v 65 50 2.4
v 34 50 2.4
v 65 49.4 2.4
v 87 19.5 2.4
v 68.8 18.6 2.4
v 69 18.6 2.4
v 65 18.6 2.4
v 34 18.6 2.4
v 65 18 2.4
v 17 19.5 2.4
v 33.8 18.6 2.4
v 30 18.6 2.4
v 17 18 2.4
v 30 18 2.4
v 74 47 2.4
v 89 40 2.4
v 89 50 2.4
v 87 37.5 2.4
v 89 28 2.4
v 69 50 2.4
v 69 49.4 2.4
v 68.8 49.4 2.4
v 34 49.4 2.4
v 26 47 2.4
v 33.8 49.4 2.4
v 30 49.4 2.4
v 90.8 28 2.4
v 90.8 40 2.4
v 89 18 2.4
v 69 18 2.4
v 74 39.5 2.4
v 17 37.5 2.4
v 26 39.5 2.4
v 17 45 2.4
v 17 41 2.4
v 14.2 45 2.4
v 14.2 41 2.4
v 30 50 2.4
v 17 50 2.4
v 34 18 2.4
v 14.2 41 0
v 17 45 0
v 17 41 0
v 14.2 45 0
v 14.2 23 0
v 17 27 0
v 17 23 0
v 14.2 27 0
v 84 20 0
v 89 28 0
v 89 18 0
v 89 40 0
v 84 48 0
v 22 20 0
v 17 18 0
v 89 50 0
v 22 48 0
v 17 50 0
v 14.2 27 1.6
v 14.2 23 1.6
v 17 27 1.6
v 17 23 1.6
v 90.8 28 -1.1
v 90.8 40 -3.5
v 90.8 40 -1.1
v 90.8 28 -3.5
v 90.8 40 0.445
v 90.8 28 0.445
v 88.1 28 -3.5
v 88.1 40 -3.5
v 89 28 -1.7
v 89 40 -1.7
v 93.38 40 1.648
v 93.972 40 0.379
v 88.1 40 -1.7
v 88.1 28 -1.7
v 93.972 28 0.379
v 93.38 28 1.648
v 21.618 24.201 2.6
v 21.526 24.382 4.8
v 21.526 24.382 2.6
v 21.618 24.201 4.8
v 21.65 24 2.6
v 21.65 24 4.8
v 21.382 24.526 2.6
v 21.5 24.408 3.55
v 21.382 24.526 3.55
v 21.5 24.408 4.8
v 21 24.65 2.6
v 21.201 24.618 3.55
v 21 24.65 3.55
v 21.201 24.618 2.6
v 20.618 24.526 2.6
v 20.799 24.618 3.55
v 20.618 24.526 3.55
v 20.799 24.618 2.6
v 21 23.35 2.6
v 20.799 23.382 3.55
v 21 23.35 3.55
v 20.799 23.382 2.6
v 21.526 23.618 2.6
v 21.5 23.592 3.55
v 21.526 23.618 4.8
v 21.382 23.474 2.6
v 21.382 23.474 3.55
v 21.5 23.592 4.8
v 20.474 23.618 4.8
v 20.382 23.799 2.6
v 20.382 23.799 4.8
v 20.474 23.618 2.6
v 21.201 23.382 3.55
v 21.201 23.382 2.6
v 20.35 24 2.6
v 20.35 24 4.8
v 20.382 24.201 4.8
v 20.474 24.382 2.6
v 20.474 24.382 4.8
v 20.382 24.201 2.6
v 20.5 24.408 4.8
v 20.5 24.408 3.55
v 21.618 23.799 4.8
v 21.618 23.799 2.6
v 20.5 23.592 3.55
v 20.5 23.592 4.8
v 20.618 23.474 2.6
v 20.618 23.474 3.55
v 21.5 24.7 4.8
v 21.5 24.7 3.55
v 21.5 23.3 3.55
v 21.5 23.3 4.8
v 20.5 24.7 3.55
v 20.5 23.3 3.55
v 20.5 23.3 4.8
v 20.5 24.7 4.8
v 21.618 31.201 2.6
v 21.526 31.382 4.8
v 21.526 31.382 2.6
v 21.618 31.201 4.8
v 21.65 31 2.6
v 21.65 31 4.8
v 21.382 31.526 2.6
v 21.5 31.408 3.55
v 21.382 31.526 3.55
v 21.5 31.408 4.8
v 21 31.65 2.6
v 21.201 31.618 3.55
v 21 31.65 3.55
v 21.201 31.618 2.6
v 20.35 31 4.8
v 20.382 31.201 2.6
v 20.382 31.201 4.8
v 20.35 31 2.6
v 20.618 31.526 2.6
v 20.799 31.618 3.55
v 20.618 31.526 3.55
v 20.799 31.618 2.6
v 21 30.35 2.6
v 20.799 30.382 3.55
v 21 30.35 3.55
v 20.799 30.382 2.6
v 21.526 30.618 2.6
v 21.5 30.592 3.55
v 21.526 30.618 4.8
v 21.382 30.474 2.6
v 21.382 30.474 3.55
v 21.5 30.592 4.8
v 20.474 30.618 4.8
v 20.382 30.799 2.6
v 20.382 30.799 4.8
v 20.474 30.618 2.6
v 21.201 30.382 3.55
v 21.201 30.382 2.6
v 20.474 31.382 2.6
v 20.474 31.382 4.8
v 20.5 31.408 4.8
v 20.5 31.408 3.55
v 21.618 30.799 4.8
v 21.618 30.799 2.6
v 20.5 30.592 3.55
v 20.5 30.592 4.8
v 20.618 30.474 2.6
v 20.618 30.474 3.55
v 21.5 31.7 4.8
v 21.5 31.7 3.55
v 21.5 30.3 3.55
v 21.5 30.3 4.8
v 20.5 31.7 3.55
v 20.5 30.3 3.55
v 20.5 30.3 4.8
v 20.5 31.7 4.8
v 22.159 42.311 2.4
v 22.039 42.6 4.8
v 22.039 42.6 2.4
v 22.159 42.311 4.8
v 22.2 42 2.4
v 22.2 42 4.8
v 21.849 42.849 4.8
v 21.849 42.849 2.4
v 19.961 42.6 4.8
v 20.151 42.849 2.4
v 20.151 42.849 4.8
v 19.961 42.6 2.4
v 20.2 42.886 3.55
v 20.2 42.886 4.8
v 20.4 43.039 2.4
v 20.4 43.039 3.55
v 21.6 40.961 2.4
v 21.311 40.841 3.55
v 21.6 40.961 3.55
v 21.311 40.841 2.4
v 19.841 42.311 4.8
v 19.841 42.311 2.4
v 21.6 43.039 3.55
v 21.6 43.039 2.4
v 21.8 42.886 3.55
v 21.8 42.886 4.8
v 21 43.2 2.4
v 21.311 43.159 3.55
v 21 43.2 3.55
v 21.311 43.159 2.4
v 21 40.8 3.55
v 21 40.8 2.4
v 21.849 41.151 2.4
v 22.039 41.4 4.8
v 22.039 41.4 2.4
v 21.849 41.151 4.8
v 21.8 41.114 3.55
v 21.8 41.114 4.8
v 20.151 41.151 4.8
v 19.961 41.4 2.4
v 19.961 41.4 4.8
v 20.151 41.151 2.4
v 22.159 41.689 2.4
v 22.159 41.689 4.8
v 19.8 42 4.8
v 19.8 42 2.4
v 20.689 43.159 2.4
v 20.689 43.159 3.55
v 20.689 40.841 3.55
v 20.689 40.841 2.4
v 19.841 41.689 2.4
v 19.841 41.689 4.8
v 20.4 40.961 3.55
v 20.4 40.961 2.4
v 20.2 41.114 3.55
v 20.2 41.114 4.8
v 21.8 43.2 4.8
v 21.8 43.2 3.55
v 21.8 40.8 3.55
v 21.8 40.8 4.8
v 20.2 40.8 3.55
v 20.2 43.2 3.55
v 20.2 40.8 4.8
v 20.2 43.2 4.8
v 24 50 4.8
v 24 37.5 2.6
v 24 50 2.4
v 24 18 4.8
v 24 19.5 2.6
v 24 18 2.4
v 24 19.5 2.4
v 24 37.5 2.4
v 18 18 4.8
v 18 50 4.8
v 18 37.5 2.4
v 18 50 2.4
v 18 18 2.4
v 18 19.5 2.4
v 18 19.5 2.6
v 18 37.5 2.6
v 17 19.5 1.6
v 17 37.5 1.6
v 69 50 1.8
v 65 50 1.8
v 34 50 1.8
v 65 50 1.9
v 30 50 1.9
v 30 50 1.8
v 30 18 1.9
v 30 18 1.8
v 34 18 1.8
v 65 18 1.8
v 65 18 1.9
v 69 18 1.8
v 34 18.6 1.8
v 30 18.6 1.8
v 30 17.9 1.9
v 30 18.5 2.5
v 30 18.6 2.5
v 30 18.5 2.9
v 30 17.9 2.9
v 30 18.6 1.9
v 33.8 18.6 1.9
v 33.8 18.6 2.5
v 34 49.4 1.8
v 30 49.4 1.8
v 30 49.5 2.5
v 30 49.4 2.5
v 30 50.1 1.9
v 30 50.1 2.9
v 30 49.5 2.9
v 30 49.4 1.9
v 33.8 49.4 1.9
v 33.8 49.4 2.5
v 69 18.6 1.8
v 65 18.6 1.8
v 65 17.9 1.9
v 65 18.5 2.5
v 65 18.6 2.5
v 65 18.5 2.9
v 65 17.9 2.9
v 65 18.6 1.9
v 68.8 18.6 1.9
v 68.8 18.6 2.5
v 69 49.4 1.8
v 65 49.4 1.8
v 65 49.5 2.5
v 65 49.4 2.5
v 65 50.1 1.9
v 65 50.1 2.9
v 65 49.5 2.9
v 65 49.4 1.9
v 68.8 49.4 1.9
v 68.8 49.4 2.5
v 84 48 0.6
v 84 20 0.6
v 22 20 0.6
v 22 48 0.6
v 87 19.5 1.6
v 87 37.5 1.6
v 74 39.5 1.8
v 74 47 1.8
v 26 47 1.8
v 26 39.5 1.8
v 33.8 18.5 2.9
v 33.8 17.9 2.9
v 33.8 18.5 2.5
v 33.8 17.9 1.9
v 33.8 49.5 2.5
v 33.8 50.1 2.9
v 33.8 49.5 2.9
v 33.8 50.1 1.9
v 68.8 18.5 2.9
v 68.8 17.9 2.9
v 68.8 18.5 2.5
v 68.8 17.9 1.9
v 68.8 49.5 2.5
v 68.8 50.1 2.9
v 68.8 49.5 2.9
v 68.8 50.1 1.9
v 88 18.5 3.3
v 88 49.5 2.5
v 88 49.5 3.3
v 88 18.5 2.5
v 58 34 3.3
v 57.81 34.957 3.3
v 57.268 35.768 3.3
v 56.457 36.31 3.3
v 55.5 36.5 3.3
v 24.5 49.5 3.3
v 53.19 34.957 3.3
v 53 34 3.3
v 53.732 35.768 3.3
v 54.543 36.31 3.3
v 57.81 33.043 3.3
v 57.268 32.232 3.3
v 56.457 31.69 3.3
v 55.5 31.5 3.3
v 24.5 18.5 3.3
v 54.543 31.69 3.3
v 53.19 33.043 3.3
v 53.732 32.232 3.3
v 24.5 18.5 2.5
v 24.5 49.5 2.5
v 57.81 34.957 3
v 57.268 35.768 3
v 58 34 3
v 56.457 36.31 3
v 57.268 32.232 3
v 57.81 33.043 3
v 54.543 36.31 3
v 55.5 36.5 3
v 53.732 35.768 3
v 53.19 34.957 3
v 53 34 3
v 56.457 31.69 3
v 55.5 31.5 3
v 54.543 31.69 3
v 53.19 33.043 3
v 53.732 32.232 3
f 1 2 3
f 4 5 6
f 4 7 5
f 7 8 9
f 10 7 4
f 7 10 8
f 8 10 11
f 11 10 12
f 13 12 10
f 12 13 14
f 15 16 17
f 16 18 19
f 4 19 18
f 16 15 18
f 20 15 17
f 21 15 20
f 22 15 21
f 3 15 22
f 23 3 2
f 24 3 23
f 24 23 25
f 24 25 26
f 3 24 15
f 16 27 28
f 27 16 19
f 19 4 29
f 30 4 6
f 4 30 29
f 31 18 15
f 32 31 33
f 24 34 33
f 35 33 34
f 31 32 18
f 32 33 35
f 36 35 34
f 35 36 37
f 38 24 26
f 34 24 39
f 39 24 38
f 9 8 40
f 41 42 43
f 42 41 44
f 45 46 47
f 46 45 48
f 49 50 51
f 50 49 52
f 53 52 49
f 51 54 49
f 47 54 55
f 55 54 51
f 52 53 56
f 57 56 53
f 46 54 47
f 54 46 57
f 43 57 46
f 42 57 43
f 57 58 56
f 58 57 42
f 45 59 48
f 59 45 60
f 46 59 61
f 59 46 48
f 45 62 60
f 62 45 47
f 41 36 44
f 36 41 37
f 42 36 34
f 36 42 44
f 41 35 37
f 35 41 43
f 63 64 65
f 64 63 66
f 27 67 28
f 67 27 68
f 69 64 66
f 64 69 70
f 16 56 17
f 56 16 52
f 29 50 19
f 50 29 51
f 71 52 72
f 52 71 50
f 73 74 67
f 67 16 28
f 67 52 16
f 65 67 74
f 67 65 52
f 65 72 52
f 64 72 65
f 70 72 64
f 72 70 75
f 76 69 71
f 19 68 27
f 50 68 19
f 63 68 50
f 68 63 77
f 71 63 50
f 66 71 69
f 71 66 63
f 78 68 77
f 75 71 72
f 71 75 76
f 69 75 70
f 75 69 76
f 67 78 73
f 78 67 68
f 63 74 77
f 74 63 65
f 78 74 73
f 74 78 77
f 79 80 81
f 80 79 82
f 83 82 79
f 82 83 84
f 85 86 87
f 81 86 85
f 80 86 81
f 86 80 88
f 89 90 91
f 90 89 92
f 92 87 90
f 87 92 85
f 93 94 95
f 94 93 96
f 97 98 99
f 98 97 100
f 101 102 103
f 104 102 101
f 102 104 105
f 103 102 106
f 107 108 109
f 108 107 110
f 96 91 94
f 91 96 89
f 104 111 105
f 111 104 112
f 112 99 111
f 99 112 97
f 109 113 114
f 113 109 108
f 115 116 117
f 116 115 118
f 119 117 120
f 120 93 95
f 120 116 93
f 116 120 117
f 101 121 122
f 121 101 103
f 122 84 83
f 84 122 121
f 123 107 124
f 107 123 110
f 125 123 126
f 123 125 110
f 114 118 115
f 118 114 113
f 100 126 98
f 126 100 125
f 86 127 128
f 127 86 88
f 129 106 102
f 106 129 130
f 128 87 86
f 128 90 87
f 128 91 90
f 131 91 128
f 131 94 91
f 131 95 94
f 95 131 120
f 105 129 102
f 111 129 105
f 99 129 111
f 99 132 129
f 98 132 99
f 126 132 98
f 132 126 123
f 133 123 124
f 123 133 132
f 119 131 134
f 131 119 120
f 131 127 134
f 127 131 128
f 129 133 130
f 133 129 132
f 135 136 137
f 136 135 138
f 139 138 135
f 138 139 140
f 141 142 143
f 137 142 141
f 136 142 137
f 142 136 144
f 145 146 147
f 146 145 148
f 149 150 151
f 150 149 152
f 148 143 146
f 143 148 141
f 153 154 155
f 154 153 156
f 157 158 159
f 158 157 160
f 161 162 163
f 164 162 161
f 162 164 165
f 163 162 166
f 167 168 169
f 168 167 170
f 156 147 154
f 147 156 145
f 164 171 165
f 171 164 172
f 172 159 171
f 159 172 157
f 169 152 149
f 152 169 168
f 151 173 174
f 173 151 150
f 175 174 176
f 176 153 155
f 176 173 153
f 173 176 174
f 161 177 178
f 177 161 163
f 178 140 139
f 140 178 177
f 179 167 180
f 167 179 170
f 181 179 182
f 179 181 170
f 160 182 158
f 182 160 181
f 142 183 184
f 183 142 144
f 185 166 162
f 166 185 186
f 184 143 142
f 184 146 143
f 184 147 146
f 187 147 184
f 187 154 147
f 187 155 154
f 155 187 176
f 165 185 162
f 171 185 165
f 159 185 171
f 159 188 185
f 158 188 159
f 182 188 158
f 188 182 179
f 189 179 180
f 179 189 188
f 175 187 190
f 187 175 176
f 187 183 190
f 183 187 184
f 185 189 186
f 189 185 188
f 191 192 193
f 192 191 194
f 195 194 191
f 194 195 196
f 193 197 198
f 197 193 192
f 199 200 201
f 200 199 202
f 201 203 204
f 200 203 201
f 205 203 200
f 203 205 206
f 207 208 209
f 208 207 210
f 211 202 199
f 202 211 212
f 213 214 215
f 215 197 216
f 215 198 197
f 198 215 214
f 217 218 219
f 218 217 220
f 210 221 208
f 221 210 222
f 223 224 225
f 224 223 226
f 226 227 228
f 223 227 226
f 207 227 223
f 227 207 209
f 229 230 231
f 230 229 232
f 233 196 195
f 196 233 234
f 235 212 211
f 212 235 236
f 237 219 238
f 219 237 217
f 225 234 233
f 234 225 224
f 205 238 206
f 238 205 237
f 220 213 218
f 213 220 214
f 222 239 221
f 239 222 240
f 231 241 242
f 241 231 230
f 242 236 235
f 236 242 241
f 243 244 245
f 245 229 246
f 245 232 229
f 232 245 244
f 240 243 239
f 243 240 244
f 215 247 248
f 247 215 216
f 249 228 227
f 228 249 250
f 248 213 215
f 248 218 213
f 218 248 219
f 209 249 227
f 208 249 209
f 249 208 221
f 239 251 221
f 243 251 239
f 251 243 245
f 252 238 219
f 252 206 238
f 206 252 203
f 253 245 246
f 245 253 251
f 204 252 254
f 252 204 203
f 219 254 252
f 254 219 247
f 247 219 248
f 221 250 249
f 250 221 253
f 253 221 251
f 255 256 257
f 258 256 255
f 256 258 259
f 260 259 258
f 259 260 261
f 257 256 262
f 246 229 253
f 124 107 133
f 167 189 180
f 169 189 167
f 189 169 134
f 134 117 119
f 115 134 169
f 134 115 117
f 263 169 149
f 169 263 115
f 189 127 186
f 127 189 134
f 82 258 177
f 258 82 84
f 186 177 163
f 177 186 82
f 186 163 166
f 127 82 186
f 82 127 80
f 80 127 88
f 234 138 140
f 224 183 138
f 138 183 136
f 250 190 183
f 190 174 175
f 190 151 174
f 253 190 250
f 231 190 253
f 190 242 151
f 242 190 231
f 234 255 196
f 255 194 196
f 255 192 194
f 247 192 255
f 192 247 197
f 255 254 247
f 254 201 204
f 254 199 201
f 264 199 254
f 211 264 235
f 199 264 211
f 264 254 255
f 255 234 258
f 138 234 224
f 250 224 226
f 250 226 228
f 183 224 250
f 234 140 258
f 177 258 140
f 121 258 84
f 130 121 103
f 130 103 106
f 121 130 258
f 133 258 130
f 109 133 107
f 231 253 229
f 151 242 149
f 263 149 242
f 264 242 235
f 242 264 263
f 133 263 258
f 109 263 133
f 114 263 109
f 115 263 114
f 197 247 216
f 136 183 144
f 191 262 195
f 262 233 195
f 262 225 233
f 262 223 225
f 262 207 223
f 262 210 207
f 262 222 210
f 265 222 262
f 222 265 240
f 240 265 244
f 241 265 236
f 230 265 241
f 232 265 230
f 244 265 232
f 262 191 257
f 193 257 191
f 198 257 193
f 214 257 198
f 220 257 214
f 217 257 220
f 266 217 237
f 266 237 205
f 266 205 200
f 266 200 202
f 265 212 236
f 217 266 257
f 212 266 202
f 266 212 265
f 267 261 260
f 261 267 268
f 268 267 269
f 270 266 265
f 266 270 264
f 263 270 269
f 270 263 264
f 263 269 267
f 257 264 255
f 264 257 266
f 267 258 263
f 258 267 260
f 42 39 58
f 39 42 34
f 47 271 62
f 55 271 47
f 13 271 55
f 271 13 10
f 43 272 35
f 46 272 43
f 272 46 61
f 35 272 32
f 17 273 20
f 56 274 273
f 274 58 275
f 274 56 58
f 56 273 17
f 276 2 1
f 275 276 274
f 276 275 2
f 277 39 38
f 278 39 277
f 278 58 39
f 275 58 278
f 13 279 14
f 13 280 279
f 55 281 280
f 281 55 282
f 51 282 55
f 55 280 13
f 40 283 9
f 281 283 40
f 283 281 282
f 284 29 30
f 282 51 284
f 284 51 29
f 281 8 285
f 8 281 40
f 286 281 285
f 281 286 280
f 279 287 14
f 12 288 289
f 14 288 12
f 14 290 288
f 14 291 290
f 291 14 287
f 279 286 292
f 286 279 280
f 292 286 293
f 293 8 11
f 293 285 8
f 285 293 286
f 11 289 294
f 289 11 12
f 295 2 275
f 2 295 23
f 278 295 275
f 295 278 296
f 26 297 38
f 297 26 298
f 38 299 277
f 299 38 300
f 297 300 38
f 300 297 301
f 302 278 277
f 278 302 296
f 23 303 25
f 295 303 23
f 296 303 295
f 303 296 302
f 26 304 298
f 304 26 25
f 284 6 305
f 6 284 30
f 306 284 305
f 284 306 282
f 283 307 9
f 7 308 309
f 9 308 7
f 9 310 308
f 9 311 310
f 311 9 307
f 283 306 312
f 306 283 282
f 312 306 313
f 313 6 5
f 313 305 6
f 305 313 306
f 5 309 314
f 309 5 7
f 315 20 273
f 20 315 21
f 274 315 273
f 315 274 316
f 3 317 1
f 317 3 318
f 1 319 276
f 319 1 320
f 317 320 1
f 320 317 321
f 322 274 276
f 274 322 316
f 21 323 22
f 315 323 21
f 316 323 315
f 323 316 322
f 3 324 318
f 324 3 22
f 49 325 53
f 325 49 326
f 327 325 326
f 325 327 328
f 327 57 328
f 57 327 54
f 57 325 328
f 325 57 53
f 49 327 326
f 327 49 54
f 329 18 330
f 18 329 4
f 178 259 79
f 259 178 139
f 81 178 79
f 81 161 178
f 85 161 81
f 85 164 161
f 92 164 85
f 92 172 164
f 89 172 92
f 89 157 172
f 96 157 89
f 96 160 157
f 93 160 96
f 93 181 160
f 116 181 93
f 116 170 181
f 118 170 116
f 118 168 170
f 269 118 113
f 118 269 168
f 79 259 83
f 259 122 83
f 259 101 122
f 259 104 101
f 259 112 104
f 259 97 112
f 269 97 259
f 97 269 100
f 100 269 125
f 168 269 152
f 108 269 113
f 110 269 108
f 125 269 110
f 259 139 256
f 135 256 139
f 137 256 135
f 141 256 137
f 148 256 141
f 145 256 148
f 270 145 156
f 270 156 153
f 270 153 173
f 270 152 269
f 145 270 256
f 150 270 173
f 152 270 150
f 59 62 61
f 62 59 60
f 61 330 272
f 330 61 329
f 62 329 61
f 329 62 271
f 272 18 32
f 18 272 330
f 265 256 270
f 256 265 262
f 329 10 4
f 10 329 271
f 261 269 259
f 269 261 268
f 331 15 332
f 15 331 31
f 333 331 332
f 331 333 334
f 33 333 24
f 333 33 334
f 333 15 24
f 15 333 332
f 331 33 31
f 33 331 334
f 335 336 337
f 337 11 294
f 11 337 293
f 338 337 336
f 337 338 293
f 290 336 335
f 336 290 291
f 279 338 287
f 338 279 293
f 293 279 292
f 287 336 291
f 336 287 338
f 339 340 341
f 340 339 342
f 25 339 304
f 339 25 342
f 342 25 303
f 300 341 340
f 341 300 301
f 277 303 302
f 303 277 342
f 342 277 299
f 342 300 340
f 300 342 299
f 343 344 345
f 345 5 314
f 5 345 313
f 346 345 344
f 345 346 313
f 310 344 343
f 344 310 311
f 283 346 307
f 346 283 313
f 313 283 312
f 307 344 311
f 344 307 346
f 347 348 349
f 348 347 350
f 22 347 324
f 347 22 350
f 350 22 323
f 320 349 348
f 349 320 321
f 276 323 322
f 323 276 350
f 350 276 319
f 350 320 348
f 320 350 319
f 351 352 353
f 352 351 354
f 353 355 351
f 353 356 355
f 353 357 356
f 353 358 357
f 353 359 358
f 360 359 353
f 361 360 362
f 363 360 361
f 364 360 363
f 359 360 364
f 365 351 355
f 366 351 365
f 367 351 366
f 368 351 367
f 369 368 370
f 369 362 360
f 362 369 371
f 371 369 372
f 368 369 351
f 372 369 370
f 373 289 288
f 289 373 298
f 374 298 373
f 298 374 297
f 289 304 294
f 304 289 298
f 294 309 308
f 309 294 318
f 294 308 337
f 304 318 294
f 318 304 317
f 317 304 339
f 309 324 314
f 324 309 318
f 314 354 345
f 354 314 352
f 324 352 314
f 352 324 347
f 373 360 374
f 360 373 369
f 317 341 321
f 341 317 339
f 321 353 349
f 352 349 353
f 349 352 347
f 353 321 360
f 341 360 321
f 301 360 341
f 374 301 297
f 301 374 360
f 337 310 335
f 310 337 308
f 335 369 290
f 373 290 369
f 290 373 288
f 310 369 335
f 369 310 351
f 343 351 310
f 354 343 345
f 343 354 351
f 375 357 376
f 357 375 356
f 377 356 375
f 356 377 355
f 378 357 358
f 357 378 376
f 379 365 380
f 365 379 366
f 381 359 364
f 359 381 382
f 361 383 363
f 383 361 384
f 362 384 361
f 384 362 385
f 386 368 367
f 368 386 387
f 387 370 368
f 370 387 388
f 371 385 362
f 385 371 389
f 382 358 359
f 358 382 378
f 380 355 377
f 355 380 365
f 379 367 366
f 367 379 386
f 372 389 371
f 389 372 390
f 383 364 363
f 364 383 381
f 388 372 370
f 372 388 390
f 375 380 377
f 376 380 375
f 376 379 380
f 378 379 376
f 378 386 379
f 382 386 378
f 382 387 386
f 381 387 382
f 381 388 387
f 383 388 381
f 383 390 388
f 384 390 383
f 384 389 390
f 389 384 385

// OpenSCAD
// file: ../../00_common/parameters.scad
// =============================================================================
// OpenMotorBridge - Global CAD Parameters & Settings
// =============================================================================
// File: hardware/cad/scad/00_common/parameters.scad
// Description: Global dimensional constants, manufacturing clearances and
//              circle resolution ($fn) for all OpenSCAD modules.
// =============================================================================

// --- 1. Circle & Curve Resolution ---
$fn = 60; // Smooth cylinders and holes for high-quality MJF 3D printing

// --- 2. Central Main Box Dimensions (3-Tier Sandwich) ---
MAIN_BOX_OUTER_L      = 110.0; // Outer length in X (mm)
MAIN_BOX_OUTER_W      = 74.0;  // Outer width in Y (mm)
MAIN_BOX_LOWER_H      = 17.0;  // Lower case height in Z (mm)
MAIN_BOX_MID_H        = 15.0;  // Mid tray height in Z (mm)
MAIN_BOX_LID_H        = 4.0;   // Lid plate thickness in Z (mm)
MAIN_BOX_WALL         = 2.5;   // Nominal wall thickness (mm)
MAIN_BOX_CORNER_POST  = 7.0;   // Corner clamping screw post size (mm, for M3 hex nut pockets)

// --- 3. Satellite Pod Dimensions (Universal Enlarged Envelope) ---
POD_OUTER_L           = 150.0; // Outer length in X (mm, standardized for serial PCBA 03 + Cardo/Sena/OMM)
POD_OUTER_W           = 70.0;  // Outer width in Y (mm)
POD_OUTER_H           = 38.0;  // Outer height in Z (mm)
POD_WALL              = 3.5;   // Nominal wall thickness (mm)
POD_BULKHEAD_X        = 18.0;  // Partition bulkhead position in X (mm)
POD_CHAMBER_L         = 132.0; // Sliding chamber length in X (mm, clears 130mm sled + 2mm margin)
POD_CHAMBER_W         = 63.0;  // Sliding chamber width in Y (mm)
POD_CHAMBER_H         = 31.0;  // Sliding chamber height in Z (mm)

// --- 4. Pod Linear Guide Rails (Poka-Yoke Tongue & Groove) ---
POD_GROOVE_W          = 3.0;   // Internal guide groove width in Z (mm)
POD_GROOVE_DEPTH      = 1.5;   // Internal guide groove depth in Y (mm)
POD_GROOVE_LEFT_Z     = 10.0;  // Center height of left groove (mm)
POD_GROOVE_RIGHT_Z    = 18.0;  // Center height of right groove (mm, asym offset)

CARTRIDGE_TONGUE_W    = 2.6;   // Cartridge tongue rail height in Z (mm, 0.2mm clearance)
CARTRIDGE_TONGUE_PROT = 1.4;   // Cartridge tongue protrusion in Y (mm, 0.1mm clearance)
CARTRIDGE_CHAMFER_L   = 4.0;   // 30° lead-in chamfer nose length (mm)

// --- 5. Cartridge Dimensions (Enlarged Universal Sled) ---
CARTRIDGE_BASE_L      = 130.0; // Sled length in X (mm, accommodates PCBA 03 + OEM Cardo Air-Mount/Sena/OMM serial layout)
CARTRIDGE_BASE_W      = 58.0;  // Sled width in Y (mm)
CARTRIDGE_BASE_H      = 28.0;  // Sled height in Z (mm)
CARTRIDGE_FACE_L      = 4.0;   // Front faceplate thickness in X (mm)
CARTRIDGE_FACE_W      = 64.0;  // Front faceplate width in Y (mm)
CARTRIDGE_FACE_H      = 34.0;  // Front faceplate height in Z (mm)

// --- 5a. RF Interface & Sealing Dimensions ---
SMA_BORE_R            = 3.25;  // Ø 6.5 mm through-hole for standard SMA bulkhead
SMA_ORECESS_R         = 4.75;  // Ø 9.5 mm recess for waterproof silicone O-ring
SMA_ORECESS_DEPTH     = 1.2;   // 1.2 mm deep O-ring compression pocket

// --- 5b. Magnetic Anti-Theft Lock System ---
LATCH_PIVOT_X         = 65.0;  // Center pivot position along sled X (mm, centered on 130mm sled)
LATCH_MAGNET_X        = 53.0;  // Ferromagnetic anchor position along sled X (mm)
LATCH_TOOTH_X         = 77.0;  // Locking sawtooth pawl position along sled X (mm)
LATCH_ARM_H           = 6.0;   // Rocker lever height in Z (mm)
LATCH_ARM_THICK       = 2.6;   // Rocker beam thickness in Y (mm)
LATCH_MAGNET_PIN_DIA  = 6.2;   // Bore for Ø 6.0 mm steel dowel pin (mm)
LATCH_SPRING_DIA      = 3.8;   // Bore for Ø 3.5 mm return compression spring (mm)

// --- 6. Standard Captive Hex Nut Pockets (DIN 934 / DIN 985 with +0.2 mm MJF/FDM clearance) ---
NUT_M2_SW             = 4.2;   // M2 across flats (nominal 4.0 mm)
NUT_M2_H              = 1.8;   // M2 thickness (nominal 1.6 mm)
NUT_M2_5_SW           = 5.2;   // M2.5 across flats (nominal 5.0 mm)
NUT_M2_5_H            = 2.2;   // M2.5 thickness (nominal 2.0 mm)
NUT_M3_SW             = 5.7;   // M3 across flats (nominal 5.5 mm)
NUT_M3_H              = 2.6;   // M3 thickness (nominal 2.4 mm)
NUT_M4_SW             = 7.2;   // M4 across flats (nominal 7.0 mm)
NUT_M4_H              = 3.4;   // M4 thickness (nominal 3.2 mm)
NUT_M5_SW             = 8.2;   // M5 across flats (nominal 8.0 mm)
NUT_M5_H              = 4.2;   // M5 thickness (nominal 4.0 mm)

// Direct Plastic Thread-Forming / Self-Tapping Pilot Holes in PA12 (100% Soldering-Iron Free)
M2_PILOT_HOLE_R       = 0.85;  // Core hole for M2 screws in PA12 (Ø 1.7 mm)
M2_5_PILOT_HOLE_R     = 1.05;  // Core hole for M2.5 screws in PA12 (Ø 2.1 mm)
M3_PILOT_HOLE_R       = 1.25;  // Core hole for M3 screws in PA12 (Ø 2.5 mm)

// --- 7. Screw & Clearance Dimensions ---
M2_SCREW_HOLE_R       = 1.1;   // M2 clearance hole (r = 1.1 mm -> Ø 2.2 mm)
M2_5_SCREW_HOLE_R     = 1.4;   // M2.5 clearance hole (r = 1.4 mm -> Ø 2.8 mm)
M3_SCREW_HOLE_R       = 1.65;  // M3 clearance hole (r = 1.65 mm -> Ø 3.3 mm)
M4_SCREW_HOLE_R       = 2.2;   // M4 clearance hole (r = 2.2 mm -> Ø 4.4 mm)
M8_BORE_R             = 4.0;   // M8 cable through-bore (r = 4.0 mm -> Ø 8.0 mm)
M8_STUDS_OUTER_R      = 6.0;   // M8 neck outer radius (Ø 12.0 mm)

// --- 8. Universal Front Node Enclosure Dimensions (Type E: 98 x 68 x 25 mm) ---
FRONT_NODE_PCB_L      = 82.0;  // PCB length in X (mm, PCBA 05)
FRONT_NODE_PCB_W      = 50.0;  // PCB width in Y (mm, PCBA 05)
FRONT_NODE_PCB_H      = 1.6;   // PCB thickness in Z (mm)
FRONT_NODE_PCB_R      = 2.5;   // PCB corner radius (mm)

FRONT_NODE_CHAMBER_L  = 86.0;  // Internal chamber length in X (mm, 2mm margin per side)
FRONT_NODE_CHAMBER_W  = 56.0;  // Internal chamber width in Y (mm, 3mm margin per side)
FRONT_NODE_TUB_H      = 17.5;  // Lower tub depth in Z (mm)
FRONT_NODE_LID_H      = 7.5;   // Upper lid height in Z (mm)
FRONT_NODE_WALL       = 2.5;   // Wall thickness in HP MJF PA12 (mm)
FRONT_NODE_CORNER_R   = 4.0;   // Outer enclosure corner radius (mm)

FRONT_NODE_OUTER_L    = FRONT_NODE_CHAMBER_L + 2 * FRONT_NODE_WALL + 7.0; // 98.0 mm
FRONT_NODE_OUTER_W    = FRONT_NODE_CHAMBER_W + 2 * FRONT_NODE_WALL + 7.0; // 68.0 mm
FRONT_NODE_OUTER_H    = FRONT_NODE_TUB_H + FRONT_NODE_LID_H;              // 25.0 mm

// PCB Standoff Heights & Radii (100% Soldering-Iron Free)
FRONT_NODE_STANDOFF_H = 3.0;   // Height of PCB standoffs from floor (mm)
FRONT_NODE_STANDOFF_R = 3.0;   // Outer radius of M2.5 screw bosses (mm)
FRONT_NODE_CORE_HOLE_R= M2_5_PILOT_HOLE_R; // Core hole for direct M2.5 screw engagement (Ø 2.1 mm)

// AMPS 4-Hole Mounting Pattern (38 x 30 mm with DIN 934 M4 Captive Nut Pockets)
AMPS_SPACING_X        = 38.0;  // AMPS hole distance in X (mm)
AMPS_SPACING_Y        = 30.0;  // AMPS hole distance in Y (mm)
AMPS_NUT_SW           = NUT_M4_SW; // Captive M4 hex nut pocket across flats (7.2 mm)
AMPS_NUT_H            = NUT_M4_H;  // Captive M4 hex nut pocket depth (3.4 mm)

// Acoustic Vent for Knowles SPH0645 MEMS
FRONT_NODE_MIC_HOLE_R = 1.25;  // Sound canal radius (Ø 2.5 mm)
FRONT_NODE_MIC_MEMB_R = 3.0;   // Gore ePTFE membrane pocket radius (Ø 6.0 mm)
FRONT_NODE_MIC_MEMB_D = 0.8;   // Membrane pocket depth (mm)
// main file
// =============================================================================
// OpenMotorBridge - Main Box: Battery Retainer & Dual Antenna Bridge
// =============================================================================
// File: hardware/cad/scad/01_main_box/parts/013_battery_antenna_bridge.scad
// Description: Multi-function modular battery retainer bridge (Akkubrücke)
//              for the Central Box Oberwanne:
//              1. Clamps 2200 mAh 1S LiPo flat cell firmly with 1.0 mm EPDM foam.
//              2. Long-axis tool-free RC-style pivot hinge (left, X = 16.5 mm).
//              3. Cantilever snap-fit lock with thumb release tab (right, X = 88.5 mm).
//              4. Dual encapsulated antenna nests for:
//                 - Taoglas FXP895 LoRa 868 MHz flex antenna (85.0 x 18.0 x 0.8 mm)
//                 - Taoglas FXP73 2.4 GHz Wi-Fi/BLE flex antenna (47.0 x 7.0 x 0.5 mm)
//              5. Snap-on protective shroud / cover plate (Schutzabdeckung, 0.8 mm)
//                 making both antennas completely touch-safe & scratch-proof.
//              6. Integrated C-clip strain-relief channels near the hinge axis
//                 for 2x U.FL coaxial cables (Ø 1.2 mm) and battery harness (Ø 2.2 mm).
//              Result: 100% CABLE-FREE ENCLOSURE LID for effortless servicing!
// =============================================================================

include <../../00_common/parameters.scad>;

module main_box_battery_antenna_bridge(
    bridge_l = 72.0,   // Active span across battery cradle in X (mm)
    bridge_w = 32.0,   // Active width across battery in Y (mm)
    bridge_t = 2.4,    // Main structural plate thickness (mm)
    show_cover = true  // Render snap-on protective cover in place
) {
    color([0.22, 0.24, 0.26]) {
        difference() {
            union() {
                // 1. Main Structural Bridge Plate
                // Centered along Y around cradle center Y = 34.0 mm (Y = 18.0 to 50.0 mm)
                translate([17.0, 18.0, 0])
                    cube([bridge_l, bridge_w, bridge_t], center=false);

                // 2. Left Side Pivot Hinge Tabs (Steck-Scharnier Zapfen at X = 14.0 mm)
                // 2x sturdy cylindrical/rounded pivot tabs that slide into cradle sockets
                for (dy = [5.0, bridge_w - 9.0]) {
                    translate([14.2, 18.0 + dy, 0]) {
                        cube([3.0, 4.0, bridge_t]);
                        translate([0, 2.0, bridge_t / 2.0])
                            rotate([0, 90, 0])
                                cylinder(r=bridge_t/2.0, h=3.0, center=false, $fn=24);
                    }
                }

                // 3. Right Side Cantilever Snap Latch Arm (at X = 89.0 mm)
                translate([17.0 + bridge_l, 18.0 + bridge_w/2.0 - 6.0, -3.5]) {
                    // Vertical flexible cantilever arm
                    cube([1.8, 12.0, 3.5 + bridge_t]);
                    // Catch tooth (locking barb pointing inward -X)
                    translate([-0.9, 0, 0])
                        cube([0.9, 12.0, 1.8]);
                    // Ergonomic thumb release tab (protrudes +X for finger actuation)
                    translate([1.8, 0, bridge_t])
                        rotate([0, -25, 0])
                            cube([3.5, 12.0, 1.4]);
                }

                // 4. Integrated C-Clip Strain Relief Bosses (near Hinge axis, X = 18.0..22.0)
                // Absorbs 100% of pull forces; protects fragile U.FL solder joints!
                translate([18.0, 18.0, bridge_t]) {
                    difference() {
                        cube([6.0, bridge_w, 2.4]);
                        // Clip 1: LoRa 868 MHz Coax (Ø 1.25 mm with 0.9 mm snap opening)
                        translate([3.0, 6.0, 1.2]) {
                            cylinder(r=0.65, h=2.6, center=true, $fn=20);
                            translate([0, 0, 0.7]) cube([1.0, 1.4, 1.5], center=true);
                        }
                        // Clip 2: 2.4 GHz Wi-Fi/BLE Coax (Ø 1.25 mm with 0.9 mm snap opening)
                        translate([3.0, 13.0, 1.2]) {
                            cylinder(r=0.65, h=2.6, center=true, $fn=20);
                            translate([0, 0, 0.7]) cube([1.0, 1.4, 1.5], center=true);
                        }
                        // Clip 3: 2-Pin Battery Lead Channel (Ø 2.4 mm)
                        translate([3.0, 24.0, 1.2]) {
                            cylinder(r=1.2, h=2.6, center=true, $fn=24);
                            translate([0, 0, 0.7]) cube([1.6, 2.4, 1.5], center=true);
                        }
                    }
                }
            }

            // --- SUBTRACTIONS (Antenna Pockets & Underside EPDM Recess) ---

            // 5. Underside EPDM Foam Recess (0.6 mm deep, centers clamping force on LiPo)
            translate([22.0, 20.0, -0.1])
                cube([62.0, bridge_w - 4.0, 0.7]);

            // 6. Top Recessed Pocket for Taoglas FXP895 LoRa Antenna (85.0 x 18.0 x 0.8 mm)
            // Extends along length X = 12.0 to 86.0 mm, Y = 19.5 to 37.5 mm
            translate([12.0, 19.5, bridge_t - 0.8])
                cube([75.0, 18.0, 1.0]);

            // 7. Top Recessed Pocket for Taoglas FXP73 2.4 GHz Flex Antenna (47.0 x 7.0 x 0.5 mm)
            // Positioned parallel alongside LoRa antenna at Y = 39.0 to 46.0 mm
            translate([26.0, 39.5, bridge_t - 0.6])
                cube([48.0, 7.5, 0.8]);

            // 8. Snap-Fit Notches for Protective Cover Plate (4x lateral detents)
            for (dx = [30.0, 65.0]) {
                translate([dx, 17.8, bridge_t - 0.6]) cube([4.0, 0.8, 0.8]);
                translate([dx, 18.0 + bridge_w - 0.6, bridge_t - 0.6]) cube([4.0, 0.8, 0.8]);
            }
        }
    }

    // 9. Snap-on Protective Cover Plate (Schutzabdeckung, 0.8 mm PA12)
    // Completely seals and protects antennas against tools, scratches & handling
    if (show_cover) {
        color([0.30, 0.55, 0.80], 0.85) {
            translate([24.5, 18.5, bridge_t + 0.1]) {
                difference() {
                    union() {
                        // Main thin shield sheet
                        cube([63.5, bridge_w - 1.0, 0.8]);
                        // Retention detent tabs that click into bridge notches
                        for (dx = [5.5, 40.5]) {
                            translate([dx, -0.6, -0.6]) cube([3.8, 0.7, 1.0]);
                            translate([dx, bridge_w - 1.0 - 0.1, -0.6]) cube([3.8, 0.7, 1.0]);
                        }
                    }
                    // Subtle embossed logo / antenna symbol identifier
                    translate([31.0, (bridge_w - 1.0)/2.0, 0.5])
                        cylinder(r=2.5, h=0.4, $fn=16);
                }
            }
        }
    }
}

// Standalone preview
main_box_battery_antenna_bridge();
